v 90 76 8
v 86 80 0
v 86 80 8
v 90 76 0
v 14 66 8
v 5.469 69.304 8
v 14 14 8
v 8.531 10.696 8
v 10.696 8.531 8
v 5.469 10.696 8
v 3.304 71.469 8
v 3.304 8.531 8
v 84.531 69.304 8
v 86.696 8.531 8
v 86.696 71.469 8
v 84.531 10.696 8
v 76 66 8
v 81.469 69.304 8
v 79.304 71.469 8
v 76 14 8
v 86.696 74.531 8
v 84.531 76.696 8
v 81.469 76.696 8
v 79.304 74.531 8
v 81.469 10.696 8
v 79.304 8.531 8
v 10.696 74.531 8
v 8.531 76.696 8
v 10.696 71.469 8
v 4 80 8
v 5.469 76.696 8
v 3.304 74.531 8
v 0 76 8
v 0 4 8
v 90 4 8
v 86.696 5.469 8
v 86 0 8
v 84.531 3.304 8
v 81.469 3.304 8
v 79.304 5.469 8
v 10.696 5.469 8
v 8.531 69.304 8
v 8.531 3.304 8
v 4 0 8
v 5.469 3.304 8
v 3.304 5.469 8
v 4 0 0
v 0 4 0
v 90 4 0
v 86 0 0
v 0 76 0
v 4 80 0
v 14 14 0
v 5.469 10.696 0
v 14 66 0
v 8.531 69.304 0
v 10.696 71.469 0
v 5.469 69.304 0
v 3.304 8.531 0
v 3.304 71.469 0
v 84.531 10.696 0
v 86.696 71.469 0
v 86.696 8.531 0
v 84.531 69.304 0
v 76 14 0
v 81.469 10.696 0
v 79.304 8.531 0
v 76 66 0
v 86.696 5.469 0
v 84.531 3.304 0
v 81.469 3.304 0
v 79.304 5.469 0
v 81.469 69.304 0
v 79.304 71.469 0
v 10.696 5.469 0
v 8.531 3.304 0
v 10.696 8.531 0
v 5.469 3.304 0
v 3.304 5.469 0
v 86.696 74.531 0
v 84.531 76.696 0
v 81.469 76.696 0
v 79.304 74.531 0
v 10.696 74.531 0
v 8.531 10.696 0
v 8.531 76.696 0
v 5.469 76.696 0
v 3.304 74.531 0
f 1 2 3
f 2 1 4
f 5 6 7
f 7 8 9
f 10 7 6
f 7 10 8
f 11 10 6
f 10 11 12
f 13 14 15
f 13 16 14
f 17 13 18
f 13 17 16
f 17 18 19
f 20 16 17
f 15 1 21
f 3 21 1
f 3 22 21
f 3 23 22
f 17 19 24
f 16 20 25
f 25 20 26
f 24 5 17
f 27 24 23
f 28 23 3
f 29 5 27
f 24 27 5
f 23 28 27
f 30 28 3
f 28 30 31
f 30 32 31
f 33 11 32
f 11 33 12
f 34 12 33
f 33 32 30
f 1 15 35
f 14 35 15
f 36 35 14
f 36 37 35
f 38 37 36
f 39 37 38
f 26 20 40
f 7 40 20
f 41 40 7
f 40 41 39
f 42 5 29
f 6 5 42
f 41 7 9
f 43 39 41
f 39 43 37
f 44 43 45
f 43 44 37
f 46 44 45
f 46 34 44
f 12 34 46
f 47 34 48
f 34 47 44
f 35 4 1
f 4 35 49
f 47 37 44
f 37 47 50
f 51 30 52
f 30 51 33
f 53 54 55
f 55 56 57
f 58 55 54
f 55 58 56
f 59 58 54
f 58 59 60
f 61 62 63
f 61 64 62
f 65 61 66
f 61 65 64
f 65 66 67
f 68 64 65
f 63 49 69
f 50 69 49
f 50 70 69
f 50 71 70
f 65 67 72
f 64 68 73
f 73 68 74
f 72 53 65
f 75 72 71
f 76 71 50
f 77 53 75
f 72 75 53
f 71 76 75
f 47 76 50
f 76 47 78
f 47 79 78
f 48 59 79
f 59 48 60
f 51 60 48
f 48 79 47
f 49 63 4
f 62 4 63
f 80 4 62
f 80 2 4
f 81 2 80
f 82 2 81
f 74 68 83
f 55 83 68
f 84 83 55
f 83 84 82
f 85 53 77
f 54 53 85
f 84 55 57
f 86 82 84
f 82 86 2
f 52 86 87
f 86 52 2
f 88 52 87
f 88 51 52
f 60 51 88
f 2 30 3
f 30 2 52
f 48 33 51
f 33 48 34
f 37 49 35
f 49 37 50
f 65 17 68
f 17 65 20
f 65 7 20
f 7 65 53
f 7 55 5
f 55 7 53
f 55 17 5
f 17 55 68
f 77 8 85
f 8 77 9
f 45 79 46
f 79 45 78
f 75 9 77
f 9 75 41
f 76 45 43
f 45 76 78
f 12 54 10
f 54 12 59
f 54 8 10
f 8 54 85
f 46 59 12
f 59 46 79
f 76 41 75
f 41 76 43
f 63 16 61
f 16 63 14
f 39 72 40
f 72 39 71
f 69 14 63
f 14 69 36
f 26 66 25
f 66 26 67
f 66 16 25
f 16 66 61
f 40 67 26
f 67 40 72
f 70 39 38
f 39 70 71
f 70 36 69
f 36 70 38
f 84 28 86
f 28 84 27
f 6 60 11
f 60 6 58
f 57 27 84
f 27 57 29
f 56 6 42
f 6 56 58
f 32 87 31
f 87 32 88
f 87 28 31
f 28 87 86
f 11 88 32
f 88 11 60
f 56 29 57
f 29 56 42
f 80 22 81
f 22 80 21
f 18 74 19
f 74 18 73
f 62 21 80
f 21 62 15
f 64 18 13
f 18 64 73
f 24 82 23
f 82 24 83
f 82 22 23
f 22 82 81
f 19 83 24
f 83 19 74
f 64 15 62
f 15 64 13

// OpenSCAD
$fn = 32;

// ----------------------------------------------------------------------
// Frame plate: 90 x 80 frame, 14 mm rails
// ----------------------------------------------------------------------

// --- parameters (mm) ---
plate_l = 90;             // plate length, X
plate_w = 80;             // plate width, Y
plate_t = 8;              // plate thickness, Z (extrusion height)
corner_c = 4;             // corner chamfer
frame_bar = 14;           // frame rail width
bolt_r = 4;               // corner bolt window radius
bolt_inset = 7;           // bolt centre inset from the edges

win_l = plate_l - 2 * frame_bar;  // window length
win_w = plate_w - 2 * frame_bar;  // window width
bolt_d = 2 * bolt_r;  // corner hole diameter

profile = [[4, 0], [86, 0], [90, 4], [90, 76], [86, 80], [4, 80], [0, 76], [0, 4]];  // primary outline, 8 points, counter clockwise
void_1 = [[14, 14], [76, 14], [76, 66], [14, 66]];  // the window, 4 points
void_2 = [[10.696, 8.531], [8.531, 10.696], [5.469, 10.696], [3.304, 8.531], [3.304, 5.469], [5.469, 3.304], [8.531, 3.304], [10.696, 5.469]];  // corner bolt window, 8 points
void_3 = [[86.696, 8.531], [84.531, 10.696], [81.469, 10.696], [79.304, 8.531], [79.304, 5.469], [81.469, 3.304], [84.531, 3.304], [86.696, 5.469]];  // corner bolt window, 8 points
void_4 = [[10.696, 74.531], [8.531, 76.696], [5.469, 76.696], [3.304, 74.531], [3.304, 71.469], [5.469, 69.304], [8.531, 69.304], [10.696, 71.469]];  // corner bolt window, 8 points
void_5 = [[86.696, 74.531], [84.531, 76.696], [81.469, 76.696], [79.304, 74.531], [79.304, 71.469], [81.469, 69.304], [84.531, 69.304], [86.696, 71.469]];  // corner bolt window, 8 points

// --- the one profile operation ---
difference() {
  linear_extrude(height = plate_t) polygon(points = profile);
  translate([0, 0, -1])
    linear_extrude(height = plate_t + 2) polygon(points = void_1);
  translate([0, 0, -1])
    linear_extrude(height = plate_t + 2) polygon(points = void_2);
  translate([0, 0, -1])
    linear_extrude(height = plate_t + 2) polygon(points = void_3);
  translate([0, 0, -1])
    linear_extrude(height = plate_t + 2) polygon(points = void_4);
  translate([0, 0, -1])
    linear_extrude(height = plate_t + 2) polygon(points = void_5);
}
